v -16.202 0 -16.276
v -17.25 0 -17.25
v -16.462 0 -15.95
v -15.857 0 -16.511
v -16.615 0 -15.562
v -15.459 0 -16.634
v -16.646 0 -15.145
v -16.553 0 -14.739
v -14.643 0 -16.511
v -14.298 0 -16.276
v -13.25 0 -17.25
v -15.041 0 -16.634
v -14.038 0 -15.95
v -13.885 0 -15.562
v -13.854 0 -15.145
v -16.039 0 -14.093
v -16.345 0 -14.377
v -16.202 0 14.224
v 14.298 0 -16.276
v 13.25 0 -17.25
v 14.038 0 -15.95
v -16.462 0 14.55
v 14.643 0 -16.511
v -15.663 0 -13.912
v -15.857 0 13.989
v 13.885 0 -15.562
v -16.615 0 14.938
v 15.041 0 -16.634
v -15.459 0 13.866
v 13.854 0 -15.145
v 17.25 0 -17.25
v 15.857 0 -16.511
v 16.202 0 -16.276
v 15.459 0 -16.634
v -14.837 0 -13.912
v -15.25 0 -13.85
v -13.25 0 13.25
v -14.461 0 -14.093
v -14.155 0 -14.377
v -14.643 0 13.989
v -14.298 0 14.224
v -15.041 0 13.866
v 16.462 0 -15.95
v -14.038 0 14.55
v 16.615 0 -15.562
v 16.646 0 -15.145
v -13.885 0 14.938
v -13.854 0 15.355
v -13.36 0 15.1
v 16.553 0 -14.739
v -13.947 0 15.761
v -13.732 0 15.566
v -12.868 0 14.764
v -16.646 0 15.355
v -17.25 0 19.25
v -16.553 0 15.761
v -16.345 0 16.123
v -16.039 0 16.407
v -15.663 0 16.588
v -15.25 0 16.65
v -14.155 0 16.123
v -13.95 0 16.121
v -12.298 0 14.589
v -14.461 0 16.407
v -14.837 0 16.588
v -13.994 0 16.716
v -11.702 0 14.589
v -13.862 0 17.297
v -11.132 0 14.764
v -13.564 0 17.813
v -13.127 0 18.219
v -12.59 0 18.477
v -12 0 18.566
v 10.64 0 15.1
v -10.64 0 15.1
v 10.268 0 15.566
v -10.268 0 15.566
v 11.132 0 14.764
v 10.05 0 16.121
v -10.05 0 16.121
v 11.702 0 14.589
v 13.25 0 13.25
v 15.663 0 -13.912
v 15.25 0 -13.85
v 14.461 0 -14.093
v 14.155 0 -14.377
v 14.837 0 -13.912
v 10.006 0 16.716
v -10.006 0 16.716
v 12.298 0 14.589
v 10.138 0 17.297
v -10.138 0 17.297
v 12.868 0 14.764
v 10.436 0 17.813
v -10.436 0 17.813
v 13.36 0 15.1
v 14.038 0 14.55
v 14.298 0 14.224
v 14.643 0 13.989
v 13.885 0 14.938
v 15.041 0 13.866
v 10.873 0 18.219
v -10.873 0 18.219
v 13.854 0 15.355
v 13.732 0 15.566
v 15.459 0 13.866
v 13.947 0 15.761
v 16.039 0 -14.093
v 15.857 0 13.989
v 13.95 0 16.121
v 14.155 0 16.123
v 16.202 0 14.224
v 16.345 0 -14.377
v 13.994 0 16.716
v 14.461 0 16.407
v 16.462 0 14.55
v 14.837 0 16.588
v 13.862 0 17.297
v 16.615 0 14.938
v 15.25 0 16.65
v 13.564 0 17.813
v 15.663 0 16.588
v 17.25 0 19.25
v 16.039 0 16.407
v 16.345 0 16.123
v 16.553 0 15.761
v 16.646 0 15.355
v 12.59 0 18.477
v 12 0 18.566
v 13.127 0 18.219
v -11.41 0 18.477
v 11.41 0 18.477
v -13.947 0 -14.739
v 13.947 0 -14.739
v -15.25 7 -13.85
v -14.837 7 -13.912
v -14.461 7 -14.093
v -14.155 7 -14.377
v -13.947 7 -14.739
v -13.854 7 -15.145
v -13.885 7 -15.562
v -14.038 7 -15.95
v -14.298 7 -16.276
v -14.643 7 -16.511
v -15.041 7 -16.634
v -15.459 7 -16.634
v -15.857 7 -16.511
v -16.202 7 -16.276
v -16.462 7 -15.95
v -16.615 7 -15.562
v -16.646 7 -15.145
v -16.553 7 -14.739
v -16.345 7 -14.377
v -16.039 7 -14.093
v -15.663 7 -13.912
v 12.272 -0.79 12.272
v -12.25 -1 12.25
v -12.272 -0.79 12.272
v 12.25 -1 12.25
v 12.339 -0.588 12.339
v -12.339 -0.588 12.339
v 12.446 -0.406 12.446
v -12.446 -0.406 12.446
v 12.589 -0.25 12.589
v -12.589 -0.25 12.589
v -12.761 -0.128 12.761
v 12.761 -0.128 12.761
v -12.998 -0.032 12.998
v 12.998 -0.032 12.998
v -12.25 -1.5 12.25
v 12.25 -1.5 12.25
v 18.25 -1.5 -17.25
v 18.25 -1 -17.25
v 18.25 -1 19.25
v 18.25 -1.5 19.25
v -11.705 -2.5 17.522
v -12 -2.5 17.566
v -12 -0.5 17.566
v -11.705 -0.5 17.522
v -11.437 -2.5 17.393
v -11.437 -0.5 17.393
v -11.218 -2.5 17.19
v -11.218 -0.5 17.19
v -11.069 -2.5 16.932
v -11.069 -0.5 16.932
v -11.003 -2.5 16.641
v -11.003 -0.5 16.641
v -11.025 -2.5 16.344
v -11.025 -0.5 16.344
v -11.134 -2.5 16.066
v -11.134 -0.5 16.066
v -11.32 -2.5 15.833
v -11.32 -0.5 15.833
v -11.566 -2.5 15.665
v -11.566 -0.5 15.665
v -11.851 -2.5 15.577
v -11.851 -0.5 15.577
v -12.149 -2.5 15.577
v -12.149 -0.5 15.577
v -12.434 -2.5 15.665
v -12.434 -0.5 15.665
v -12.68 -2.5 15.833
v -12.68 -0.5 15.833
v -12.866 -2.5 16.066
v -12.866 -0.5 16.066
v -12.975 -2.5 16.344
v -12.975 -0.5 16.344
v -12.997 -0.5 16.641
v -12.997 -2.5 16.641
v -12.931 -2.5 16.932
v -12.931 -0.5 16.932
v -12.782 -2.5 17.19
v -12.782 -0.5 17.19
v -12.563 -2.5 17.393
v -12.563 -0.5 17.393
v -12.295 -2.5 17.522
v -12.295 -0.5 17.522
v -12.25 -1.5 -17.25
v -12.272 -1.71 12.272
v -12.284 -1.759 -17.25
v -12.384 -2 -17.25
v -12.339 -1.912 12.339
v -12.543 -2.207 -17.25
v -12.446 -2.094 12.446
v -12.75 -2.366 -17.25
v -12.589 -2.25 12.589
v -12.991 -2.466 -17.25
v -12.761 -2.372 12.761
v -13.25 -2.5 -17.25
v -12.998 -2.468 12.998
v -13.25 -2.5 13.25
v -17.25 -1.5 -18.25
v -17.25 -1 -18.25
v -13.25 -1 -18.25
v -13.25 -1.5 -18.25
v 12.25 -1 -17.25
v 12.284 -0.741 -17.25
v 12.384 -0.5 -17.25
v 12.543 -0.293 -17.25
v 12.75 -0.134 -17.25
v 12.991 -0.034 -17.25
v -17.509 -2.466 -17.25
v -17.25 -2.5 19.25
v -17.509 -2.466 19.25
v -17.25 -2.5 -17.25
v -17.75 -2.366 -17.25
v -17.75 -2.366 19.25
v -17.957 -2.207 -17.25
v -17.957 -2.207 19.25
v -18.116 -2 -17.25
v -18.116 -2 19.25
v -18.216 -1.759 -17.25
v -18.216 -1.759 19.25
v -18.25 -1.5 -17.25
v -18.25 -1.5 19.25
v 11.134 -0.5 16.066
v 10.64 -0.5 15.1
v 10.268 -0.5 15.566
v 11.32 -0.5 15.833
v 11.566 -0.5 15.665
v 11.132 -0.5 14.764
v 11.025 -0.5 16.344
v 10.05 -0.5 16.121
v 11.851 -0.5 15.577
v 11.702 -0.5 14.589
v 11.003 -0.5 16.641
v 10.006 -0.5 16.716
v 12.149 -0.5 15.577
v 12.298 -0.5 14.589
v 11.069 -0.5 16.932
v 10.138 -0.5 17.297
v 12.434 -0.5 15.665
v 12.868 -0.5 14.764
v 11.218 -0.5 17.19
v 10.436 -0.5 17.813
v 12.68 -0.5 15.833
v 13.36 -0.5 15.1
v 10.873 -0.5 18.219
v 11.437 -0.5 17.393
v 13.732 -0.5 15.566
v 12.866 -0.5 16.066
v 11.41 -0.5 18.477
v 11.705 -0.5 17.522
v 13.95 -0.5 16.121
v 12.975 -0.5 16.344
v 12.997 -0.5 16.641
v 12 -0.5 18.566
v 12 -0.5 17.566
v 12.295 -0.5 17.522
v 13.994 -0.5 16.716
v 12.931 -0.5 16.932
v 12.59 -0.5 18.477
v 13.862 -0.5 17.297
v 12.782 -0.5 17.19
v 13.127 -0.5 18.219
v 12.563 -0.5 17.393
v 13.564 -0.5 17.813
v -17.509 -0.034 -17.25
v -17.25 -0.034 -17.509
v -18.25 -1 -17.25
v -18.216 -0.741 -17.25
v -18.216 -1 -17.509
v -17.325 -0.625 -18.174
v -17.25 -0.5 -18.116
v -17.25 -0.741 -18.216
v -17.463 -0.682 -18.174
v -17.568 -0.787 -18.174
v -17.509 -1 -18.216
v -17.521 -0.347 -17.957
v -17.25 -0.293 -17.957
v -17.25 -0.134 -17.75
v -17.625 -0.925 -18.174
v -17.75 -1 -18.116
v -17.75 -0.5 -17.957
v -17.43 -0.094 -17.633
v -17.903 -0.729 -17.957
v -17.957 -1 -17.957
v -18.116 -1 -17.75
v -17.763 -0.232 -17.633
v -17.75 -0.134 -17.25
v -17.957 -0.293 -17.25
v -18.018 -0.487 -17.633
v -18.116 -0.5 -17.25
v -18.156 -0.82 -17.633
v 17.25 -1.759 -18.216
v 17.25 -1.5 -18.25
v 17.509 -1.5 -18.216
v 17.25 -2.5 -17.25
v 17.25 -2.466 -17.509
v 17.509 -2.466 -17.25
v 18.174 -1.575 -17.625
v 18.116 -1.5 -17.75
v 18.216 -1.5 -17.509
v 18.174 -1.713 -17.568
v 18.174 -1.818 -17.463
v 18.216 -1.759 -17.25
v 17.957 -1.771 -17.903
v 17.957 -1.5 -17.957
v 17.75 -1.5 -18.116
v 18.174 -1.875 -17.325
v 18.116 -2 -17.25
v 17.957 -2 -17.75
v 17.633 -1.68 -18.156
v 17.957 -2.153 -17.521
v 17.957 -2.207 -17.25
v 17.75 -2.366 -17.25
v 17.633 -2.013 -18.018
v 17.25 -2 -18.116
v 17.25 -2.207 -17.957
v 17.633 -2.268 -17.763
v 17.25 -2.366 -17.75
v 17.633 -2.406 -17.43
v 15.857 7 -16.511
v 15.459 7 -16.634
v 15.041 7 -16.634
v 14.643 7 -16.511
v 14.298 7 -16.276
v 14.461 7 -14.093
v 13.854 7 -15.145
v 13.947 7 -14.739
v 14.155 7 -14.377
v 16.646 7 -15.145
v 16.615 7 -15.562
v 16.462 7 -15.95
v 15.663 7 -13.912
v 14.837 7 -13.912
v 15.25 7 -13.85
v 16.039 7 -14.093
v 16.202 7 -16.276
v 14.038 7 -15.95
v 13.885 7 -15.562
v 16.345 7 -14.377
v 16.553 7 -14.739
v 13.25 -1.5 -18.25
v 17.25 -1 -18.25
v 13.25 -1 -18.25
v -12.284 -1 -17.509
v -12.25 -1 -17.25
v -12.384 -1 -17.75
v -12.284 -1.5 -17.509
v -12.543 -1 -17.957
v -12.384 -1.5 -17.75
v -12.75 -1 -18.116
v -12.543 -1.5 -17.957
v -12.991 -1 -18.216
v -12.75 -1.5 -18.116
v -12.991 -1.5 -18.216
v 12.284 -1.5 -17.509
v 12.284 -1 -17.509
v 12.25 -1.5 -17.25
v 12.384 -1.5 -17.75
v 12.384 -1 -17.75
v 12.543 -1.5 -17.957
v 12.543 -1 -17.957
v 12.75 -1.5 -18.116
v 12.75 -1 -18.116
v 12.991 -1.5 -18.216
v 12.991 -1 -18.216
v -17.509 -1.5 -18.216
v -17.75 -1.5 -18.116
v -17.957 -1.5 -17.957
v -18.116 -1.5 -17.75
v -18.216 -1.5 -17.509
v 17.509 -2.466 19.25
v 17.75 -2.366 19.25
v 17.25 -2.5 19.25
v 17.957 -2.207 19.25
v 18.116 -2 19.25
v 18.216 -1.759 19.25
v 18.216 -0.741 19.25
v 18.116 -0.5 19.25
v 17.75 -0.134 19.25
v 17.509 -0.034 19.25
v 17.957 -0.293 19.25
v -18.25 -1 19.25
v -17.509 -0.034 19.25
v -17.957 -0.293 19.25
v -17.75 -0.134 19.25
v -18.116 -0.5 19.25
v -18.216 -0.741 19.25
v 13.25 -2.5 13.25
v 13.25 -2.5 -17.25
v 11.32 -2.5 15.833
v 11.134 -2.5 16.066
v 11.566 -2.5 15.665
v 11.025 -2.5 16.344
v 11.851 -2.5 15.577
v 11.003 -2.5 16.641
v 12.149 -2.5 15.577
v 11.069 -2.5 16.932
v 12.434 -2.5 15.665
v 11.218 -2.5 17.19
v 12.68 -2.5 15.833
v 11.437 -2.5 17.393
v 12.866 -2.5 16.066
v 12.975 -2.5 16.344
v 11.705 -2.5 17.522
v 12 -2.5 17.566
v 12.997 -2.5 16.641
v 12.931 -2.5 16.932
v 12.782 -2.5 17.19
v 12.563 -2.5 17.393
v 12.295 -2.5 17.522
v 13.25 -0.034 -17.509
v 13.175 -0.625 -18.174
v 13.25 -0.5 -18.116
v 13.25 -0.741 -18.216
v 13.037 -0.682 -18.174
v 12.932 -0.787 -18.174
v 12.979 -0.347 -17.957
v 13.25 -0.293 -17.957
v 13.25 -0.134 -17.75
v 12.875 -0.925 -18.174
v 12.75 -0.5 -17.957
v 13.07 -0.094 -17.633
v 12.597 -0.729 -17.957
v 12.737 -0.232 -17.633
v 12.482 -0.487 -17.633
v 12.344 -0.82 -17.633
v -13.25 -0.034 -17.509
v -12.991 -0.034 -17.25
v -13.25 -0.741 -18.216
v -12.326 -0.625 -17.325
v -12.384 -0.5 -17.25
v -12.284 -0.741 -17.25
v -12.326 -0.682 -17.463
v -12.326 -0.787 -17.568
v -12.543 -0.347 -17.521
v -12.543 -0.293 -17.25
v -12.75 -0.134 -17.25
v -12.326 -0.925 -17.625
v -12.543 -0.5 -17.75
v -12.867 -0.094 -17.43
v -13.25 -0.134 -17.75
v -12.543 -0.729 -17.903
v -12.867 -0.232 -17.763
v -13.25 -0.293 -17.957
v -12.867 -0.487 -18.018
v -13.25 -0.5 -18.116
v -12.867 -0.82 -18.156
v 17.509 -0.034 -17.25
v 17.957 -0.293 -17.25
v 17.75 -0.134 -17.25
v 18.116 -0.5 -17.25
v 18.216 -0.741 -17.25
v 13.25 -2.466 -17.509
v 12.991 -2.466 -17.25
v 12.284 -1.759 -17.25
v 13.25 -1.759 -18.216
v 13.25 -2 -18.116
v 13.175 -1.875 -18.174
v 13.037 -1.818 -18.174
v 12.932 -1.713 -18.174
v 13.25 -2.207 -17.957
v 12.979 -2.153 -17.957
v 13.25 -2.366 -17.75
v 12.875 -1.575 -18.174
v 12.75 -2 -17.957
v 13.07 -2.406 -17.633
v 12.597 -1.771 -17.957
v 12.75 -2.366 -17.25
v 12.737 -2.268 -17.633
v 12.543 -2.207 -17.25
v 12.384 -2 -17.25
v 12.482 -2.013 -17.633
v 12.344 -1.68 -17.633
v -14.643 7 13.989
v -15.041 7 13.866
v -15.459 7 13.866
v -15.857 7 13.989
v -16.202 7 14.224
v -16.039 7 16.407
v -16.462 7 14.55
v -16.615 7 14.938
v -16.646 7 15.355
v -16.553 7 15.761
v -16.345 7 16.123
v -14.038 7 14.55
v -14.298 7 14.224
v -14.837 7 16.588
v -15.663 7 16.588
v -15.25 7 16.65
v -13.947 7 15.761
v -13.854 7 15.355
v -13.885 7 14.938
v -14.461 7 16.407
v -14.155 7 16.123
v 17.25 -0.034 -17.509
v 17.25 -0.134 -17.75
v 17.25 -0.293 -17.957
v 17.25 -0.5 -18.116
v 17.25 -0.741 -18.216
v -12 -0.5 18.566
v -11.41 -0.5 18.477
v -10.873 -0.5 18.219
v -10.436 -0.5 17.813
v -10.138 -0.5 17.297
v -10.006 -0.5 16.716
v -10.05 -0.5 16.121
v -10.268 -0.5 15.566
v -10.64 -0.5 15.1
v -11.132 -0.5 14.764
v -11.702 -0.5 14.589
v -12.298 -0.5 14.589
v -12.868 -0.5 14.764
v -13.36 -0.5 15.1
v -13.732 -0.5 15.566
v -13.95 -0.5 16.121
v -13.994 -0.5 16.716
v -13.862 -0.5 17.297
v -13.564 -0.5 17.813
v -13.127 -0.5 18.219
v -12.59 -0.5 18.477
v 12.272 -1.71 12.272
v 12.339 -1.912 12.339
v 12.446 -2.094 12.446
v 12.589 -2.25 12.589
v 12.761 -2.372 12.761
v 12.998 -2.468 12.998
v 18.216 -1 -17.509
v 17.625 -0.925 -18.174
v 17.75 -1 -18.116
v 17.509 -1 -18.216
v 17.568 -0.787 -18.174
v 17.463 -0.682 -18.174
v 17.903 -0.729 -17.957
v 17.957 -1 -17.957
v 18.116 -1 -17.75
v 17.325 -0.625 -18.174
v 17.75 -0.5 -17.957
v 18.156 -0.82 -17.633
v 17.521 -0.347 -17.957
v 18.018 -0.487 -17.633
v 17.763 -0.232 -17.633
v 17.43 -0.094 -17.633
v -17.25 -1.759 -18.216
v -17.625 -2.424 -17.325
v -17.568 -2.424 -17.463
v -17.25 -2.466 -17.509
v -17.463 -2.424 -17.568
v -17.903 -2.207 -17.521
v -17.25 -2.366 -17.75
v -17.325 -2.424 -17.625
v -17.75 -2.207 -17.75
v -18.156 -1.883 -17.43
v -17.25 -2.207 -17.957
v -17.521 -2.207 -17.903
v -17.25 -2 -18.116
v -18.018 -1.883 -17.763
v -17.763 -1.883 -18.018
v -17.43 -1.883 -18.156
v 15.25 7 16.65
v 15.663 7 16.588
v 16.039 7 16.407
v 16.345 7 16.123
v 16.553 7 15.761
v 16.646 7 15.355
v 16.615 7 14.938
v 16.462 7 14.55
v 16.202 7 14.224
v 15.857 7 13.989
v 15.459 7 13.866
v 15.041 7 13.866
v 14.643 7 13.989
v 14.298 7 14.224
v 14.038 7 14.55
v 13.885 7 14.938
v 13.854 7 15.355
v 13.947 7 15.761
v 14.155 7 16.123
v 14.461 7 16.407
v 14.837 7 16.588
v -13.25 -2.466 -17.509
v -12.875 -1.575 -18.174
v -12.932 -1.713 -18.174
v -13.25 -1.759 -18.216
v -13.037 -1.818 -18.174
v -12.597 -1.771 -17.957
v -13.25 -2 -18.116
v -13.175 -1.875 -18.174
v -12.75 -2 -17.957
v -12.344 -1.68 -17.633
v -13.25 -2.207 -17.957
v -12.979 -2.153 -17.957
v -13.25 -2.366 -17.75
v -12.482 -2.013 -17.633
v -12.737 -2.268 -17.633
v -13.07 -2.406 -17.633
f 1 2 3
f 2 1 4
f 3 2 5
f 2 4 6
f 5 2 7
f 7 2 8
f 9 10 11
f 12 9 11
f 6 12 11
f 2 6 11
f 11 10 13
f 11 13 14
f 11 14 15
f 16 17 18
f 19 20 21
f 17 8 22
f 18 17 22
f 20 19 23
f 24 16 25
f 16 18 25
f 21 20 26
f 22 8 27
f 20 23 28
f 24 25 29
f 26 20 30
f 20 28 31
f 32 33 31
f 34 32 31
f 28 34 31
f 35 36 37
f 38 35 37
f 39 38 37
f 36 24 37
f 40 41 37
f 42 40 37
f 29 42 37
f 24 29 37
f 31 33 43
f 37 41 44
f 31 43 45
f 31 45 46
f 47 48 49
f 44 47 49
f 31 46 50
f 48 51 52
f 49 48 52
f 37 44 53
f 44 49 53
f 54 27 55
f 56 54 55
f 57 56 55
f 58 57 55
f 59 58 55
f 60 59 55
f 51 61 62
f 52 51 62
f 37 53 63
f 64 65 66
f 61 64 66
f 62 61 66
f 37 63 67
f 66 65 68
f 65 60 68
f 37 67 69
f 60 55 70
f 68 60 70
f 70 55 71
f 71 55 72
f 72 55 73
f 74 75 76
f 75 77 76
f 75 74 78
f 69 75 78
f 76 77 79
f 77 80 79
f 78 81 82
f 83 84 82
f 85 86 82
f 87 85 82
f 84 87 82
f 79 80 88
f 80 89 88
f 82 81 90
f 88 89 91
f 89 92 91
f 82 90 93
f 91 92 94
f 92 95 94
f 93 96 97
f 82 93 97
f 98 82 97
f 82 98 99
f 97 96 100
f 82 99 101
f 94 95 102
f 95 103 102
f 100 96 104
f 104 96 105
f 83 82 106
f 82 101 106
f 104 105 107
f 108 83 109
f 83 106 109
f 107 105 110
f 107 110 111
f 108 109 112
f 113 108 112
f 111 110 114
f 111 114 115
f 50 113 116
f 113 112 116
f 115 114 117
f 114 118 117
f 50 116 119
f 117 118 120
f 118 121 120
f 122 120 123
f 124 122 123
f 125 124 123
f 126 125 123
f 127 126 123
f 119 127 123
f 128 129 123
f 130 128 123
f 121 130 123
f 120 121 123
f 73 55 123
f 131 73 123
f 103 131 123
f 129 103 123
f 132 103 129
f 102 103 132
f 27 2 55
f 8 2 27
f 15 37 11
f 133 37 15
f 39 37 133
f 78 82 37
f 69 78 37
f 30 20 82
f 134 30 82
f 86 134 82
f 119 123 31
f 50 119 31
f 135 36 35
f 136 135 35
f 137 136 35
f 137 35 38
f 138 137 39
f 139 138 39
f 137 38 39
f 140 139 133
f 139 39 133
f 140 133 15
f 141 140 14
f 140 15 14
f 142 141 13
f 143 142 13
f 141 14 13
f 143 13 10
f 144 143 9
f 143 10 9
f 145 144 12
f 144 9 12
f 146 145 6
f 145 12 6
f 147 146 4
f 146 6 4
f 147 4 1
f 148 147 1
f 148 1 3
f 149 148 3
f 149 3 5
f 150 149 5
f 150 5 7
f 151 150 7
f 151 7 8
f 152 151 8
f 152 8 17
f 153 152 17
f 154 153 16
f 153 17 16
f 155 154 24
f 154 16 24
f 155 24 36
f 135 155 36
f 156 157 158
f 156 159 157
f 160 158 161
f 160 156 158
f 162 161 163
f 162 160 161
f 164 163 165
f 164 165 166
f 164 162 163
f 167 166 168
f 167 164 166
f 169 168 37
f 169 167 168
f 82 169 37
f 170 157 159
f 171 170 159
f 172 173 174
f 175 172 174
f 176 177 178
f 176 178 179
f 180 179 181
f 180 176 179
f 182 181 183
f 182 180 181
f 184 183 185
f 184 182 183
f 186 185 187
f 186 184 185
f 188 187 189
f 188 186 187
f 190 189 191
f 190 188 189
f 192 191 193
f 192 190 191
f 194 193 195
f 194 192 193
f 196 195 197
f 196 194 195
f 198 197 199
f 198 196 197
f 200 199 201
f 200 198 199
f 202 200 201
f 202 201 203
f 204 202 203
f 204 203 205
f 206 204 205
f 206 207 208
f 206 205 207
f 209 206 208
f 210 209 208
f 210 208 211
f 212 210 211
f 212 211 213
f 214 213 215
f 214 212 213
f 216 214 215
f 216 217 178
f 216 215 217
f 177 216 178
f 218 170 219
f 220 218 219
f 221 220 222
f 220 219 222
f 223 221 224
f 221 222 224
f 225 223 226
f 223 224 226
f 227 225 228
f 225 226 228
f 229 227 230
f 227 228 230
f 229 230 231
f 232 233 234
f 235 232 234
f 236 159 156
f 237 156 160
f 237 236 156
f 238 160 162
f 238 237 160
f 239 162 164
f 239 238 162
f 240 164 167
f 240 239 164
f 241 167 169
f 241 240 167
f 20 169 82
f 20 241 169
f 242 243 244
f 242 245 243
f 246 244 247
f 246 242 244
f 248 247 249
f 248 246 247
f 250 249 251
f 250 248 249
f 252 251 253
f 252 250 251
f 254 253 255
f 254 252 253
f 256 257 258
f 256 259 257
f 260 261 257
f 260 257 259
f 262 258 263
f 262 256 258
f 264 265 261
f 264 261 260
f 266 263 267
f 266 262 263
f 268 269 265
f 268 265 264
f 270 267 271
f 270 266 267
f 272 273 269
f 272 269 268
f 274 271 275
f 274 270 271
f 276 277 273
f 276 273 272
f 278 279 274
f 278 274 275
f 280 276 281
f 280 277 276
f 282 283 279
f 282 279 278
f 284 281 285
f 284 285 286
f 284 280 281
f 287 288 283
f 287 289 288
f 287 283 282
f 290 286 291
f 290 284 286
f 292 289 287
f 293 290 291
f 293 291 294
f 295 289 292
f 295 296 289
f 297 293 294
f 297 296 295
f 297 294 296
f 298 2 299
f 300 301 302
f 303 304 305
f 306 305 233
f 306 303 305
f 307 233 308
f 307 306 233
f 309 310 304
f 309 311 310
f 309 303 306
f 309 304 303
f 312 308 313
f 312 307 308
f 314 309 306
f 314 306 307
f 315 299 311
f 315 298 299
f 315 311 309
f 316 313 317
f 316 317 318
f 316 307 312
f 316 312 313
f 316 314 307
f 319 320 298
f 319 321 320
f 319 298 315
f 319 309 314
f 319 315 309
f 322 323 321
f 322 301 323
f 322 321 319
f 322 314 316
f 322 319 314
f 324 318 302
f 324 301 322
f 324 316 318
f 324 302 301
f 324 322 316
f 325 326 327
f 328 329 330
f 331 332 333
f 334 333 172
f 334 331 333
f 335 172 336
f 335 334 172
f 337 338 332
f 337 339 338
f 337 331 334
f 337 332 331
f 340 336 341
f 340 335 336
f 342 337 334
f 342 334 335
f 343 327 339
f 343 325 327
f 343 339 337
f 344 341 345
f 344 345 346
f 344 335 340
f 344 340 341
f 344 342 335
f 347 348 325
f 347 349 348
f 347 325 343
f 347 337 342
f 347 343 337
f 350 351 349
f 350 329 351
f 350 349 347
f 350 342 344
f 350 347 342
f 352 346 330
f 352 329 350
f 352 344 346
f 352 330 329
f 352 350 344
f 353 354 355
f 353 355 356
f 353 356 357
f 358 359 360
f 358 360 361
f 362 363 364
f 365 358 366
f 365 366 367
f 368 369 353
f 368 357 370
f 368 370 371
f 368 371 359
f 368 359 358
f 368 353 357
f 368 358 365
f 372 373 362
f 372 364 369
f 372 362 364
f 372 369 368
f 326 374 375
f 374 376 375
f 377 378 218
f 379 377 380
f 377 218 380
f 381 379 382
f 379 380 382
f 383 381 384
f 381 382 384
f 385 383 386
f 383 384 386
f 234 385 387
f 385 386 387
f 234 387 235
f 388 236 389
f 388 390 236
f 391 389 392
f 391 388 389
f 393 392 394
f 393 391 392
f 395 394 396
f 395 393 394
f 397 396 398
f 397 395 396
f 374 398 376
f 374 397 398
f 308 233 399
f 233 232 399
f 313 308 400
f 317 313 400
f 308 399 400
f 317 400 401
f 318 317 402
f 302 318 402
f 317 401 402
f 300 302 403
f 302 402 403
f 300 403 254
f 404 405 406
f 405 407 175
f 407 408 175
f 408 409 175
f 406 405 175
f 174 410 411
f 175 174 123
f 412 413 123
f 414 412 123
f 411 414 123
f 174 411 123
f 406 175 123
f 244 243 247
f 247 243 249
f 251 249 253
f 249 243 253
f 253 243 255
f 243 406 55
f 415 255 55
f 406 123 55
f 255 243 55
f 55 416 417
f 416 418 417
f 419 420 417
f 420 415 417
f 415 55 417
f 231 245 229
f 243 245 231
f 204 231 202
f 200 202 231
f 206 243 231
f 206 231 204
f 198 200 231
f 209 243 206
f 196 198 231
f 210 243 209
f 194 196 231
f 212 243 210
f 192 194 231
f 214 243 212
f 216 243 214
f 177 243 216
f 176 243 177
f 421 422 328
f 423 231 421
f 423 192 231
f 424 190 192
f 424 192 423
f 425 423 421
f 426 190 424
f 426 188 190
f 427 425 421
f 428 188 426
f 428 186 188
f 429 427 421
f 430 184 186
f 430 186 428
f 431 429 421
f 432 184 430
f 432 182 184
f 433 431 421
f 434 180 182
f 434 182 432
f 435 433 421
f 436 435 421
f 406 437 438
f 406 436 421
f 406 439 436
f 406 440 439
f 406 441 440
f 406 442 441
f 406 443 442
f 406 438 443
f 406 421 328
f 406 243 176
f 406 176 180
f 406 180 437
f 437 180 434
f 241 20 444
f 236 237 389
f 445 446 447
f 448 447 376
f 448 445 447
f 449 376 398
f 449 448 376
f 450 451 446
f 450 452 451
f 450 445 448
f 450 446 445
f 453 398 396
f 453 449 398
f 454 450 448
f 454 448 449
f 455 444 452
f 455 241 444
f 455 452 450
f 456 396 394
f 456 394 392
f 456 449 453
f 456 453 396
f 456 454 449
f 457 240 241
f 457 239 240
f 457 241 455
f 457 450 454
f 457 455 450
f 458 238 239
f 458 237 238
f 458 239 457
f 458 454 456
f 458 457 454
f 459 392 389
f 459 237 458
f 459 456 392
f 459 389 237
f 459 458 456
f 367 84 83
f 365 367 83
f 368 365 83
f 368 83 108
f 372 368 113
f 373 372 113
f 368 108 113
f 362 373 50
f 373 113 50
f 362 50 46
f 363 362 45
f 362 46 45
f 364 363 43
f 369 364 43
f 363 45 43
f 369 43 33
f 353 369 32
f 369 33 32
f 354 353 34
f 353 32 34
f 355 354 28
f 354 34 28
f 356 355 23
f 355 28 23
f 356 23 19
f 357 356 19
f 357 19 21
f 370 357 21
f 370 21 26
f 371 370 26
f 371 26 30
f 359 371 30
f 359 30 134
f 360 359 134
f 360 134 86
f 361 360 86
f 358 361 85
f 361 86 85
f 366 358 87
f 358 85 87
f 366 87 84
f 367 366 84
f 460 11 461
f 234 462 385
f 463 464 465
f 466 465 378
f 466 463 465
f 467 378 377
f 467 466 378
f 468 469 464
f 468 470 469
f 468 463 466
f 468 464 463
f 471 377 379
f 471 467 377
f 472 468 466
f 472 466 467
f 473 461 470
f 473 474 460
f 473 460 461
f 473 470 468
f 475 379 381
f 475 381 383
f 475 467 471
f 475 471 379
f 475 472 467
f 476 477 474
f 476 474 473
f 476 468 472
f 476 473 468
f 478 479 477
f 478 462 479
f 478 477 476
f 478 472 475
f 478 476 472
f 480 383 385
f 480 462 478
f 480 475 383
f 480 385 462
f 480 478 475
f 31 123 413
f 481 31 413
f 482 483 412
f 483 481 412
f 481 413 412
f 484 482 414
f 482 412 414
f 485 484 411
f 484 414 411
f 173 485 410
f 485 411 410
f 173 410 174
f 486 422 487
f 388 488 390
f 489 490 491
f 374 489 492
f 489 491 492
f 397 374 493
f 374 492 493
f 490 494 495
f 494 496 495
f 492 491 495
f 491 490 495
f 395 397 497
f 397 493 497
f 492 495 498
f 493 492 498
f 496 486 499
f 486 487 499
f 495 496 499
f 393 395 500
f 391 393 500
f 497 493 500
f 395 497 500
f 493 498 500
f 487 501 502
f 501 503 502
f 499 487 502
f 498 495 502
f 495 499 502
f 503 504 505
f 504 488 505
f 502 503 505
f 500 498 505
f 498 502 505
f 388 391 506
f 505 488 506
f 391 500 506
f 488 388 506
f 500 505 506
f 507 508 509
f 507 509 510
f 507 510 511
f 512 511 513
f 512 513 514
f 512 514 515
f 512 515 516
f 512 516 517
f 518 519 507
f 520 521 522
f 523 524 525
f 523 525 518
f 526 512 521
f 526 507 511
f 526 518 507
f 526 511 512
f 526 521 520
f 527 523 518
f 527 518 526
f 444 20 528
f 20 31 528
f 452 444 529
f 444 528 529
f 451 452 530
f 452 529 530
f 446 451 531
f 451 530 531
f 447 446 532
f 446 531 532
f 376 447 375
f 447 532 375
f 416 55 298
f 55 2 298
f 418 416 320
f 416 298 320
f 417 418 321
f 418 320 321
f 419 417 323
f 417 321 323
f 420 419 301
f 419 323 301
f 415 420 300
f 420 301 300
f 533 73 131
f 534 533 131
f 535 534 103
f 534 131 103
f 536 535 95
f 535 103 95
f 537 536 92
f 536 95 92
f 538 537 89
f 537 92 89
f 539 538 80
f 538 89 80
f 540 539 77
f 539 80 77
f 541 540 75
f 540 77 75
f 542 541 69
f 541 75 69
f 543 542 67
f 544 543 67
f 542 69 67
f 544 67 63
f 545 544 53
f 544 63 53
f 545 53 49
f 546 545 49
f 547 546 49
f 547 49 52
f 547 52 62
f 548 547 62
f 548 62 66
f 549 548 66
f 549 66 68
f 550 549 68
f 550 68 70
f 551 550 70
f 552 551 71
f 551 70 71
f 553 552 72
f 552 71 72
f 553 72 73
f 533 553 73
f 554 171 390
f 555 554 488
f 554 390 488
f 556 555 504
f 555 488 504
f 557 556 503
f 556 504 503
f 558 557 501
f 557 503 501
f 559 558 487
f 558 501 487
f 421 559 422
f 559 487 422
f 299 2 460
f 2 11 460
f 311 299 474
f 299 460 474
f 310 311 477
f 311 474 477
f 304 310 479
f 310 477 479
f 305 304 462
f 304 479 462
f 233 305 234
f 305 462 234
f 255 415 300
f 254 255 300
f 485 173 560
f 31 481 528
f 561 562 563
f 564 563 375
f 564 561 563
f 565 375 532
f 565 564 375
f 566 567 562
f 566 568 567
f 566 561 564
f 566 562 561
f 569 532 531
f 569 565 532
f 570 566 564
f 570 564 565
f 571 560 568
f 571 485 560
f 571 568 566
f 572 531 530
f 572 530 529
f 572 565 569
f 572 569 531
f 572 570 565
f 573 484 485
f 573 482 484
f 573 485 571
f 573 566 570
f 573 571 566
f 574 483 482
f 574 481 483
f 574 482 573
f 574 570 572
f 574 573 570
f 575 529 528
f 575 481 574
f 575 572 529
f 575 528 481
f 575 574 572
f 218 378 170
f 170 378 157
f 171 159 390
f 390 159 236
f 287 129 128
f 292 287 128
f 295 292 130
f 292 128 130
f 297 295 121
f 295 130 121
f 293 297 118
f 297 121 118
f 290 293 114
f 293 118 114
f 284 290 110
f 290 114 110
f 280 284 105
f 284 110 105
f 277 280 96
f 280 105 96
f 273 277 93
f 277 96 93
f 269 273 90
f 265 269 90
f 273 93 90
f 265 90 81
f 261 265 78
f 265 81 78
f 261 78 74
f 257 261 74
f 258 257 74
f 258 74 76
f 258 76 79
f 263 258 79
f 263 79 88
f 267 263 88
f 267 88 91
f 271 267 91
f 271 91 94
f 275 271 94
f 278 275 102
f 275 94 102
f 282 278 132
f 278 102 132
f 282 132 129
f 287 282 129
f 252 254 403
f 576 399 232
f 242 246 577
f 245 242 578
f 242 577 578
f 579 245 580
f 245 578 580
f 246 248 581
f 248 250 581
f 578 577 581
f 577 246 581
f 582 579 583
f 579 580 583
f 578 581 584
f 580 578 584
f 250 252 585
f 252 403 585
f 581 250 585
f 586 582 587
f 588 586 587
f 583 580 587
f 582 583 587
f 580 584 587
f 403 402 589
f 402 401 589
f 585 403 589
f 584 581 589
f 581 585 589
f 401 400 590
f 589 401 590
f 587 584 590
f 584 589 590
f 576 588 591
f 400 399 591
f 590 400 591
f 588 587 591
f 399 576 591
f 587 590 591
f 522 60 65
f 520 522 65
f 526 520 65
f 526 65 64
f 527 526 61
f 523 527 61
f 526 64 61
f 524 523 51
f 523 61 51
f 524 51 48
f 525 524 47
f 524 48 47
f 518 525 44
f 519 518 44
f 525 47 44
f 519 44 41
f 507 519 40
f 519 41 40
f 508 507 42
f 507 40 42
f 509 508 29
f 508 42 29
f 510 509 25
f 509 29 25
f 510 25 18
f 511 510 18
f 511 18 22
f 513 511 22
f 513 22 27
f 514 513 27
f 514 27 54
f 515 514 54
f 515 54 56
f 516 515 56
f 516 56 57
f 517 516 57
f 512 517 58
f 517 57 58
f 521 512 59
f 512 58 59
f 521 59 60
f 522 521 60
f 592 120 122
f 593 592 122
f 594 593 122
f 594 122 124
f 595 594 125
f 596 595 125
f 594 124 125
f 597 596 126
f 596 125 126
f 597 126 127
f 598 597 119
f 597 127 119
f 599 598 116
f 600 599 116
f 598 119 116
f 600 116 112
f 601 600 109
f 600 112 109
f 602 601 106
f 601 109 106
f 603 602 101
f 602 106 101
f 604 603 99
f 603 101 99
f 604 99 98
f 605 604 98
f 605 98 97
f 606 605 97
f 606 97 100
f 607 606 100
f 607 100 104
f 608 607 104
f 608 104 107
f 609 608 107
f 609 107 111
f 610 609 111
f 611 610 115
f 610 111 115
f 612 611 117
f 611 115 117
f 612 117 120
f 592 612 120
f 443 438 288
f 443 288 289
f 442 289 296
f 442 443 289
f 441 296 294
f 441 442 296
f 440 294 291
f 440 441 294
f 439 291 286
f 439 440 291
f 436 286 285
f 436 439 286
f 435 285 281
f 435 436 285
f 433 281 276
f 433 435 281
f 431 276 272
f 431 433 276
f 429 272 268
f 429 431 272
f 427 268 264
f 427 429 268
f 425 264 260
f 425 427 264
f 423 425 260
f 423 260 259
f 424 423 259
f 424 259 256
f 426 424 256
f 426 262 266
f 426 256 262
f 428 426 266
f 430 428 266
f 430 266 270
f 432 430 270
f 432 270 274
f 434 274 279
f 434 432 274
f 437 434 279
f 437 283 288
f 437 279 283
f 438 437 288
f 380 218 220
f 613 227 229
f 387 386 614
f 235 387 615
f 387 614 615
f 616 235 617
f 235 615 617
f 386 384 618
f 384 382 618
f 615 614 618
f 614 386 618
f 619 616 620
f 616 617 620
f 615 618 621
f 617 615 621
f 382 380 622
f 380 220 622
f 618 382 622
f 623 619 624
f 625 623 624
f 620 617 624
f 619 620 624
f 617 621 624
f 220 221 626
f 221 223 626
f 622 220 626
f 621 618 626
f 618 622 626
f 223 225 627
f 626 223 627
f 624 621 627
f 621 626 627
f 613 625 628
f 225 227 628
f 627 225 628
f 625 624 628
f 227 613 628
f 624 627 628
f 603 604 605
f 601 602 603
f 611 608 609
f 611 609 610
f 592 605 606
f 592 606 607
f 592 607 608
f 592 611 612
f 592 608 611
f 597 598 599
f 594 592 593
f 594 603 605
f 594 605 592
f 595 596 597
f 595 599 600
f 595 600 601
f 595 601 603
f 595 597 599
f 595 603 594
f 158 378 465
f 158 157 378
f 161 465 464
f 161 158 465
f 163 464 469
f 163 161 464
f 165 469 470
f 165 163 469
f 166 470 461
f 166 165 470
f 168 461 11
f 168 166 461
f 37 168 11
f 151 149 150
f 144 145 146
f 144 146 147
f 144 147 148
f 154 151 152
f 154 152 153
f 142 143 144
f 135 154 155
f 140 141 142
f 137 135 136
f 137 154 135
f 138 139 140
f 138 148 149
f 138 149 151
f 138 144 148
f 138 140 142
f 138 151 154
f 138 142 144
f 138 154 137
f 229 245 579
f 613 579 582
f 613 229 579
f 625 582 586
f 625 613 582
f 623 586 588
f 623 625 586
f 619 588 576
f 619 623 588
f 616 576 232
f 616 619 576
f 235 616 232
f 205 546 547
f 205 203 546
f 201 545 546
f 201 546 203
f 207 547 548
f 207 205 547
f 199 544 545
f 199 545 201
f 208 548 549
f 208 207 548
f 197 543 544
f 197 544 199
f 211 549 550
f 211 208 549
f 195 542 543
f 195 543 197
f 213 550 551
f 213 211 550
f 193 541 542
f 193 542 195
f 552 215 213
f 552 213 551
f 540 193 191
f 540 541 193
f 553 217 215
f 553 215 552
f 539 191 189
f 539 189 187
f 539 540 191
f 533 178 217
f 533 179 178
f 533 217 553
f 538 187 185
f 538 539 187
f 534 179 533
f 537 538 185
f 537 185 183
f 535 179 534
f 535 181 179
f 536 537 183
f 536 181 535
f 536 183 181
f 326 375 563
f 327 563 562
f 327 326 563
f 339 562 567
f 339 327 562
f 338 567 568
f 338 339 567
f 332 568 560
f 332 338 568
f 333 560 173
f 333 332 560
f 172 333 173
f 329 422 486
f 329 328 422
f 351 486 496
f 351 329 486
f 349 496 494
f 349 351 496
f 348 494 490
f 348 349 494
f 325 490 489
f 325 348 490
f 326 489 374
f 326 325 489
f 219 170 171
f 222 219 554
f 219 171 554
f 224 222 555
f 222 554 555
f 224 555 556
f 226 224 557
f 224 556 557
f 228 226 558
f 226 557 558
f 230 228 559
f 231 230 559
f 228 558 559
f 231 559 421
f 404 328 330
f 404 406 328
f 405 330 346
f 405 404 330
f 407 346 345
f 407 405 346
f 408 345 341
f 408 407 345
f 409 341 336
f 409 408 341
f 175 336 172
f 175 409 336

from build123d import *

# Parameters (mm, degrees)
SKETCH1_R               = 1.4
BOSS_EXTRUDE1_DEPTH     = 7
BOSS_EXTRUDE1_2_DEPTH   = 7
BOSS_EXTRUDE1_3_DEPTH   = 7
BOSS_EXTRUDE1_4_DEPTH   = 7
BOSS_EXTRUDE2_DEPTH     = 2.5
FILLET1_R               = 1
CUT_EXTRUDE1_DEPTH      = 28.434011737
CUT_EXTRUDE1_DEPTH_BACK = 28.434011737
SKETCH4_R               = 1
SKETCH5_R               = 2
CUT_EXTRUDE2_DEPTH      = 0.5


with BuildPart() as part:
    # Sketch1 → Boss-Extrude1 (new body)
    with BuildSketch(Plane(origin=(0, 0, 0), x_dir=(1, 0, 0), z_dir=(0, 1, 0))):
        with Locations(Location((-15.25, -15.25, 0), (0, 0, 270))):
            Circle(SKETCH1_R)
    extrude(amount=BOSS_EXTRUDE1_DEPTH)



with BuildPart() as body_2:
    # Sketch1 → Boss-Extrude1 2 (new body)
    with BuildSketch(Plane(origin=(0, 0, 0), x_dir=(1, 0, 0), z_dir=(0, 1, 0))):
        with Locations(Location((-15.25, 15.25, 0), (0, 0, 270))):
            Circle(SKETCH1_R)
    extrude(amount=BOSS_EXTRUDE1_2_DEPTH)


with BuildPart() as body_3:
    # Sketch1 → Boss-Extrude1 3 (new body)
    with BuildSketch(Plane(origin=(0, 0, 0), x_dir=(1, 0, 0), z_dir=(0, 1, 0))):
        with Locations(Location((15.25, 15.25, 0), (0, 0, 270))):
            Circle(SKETCH1_R)
    extrude(amount=BOSS_EXTRUDE1_3_DEPTH)


with BuildPart() as body_4:
    # Sketch1 → Boss-Extrude1 4 (new body)
    with BuildSketch(Plane(origin=(0, 0, 0), x_dir=(1, 0, 0), z_dir=(0, 1, 0))):
        with Locations(Location((15.25, -15.25, 0), (0, 0, 270))):
            Circle(SKETCH1_R)
    extrude(amount=BOSS_EXTRUDE1_4_DEPTH)


with BuildPart() as part_1:
    add(part.part)

    add(body_2.part)  # Boss-Extrude2 merges body 2

    add(body_3.part)  # Boss-Extrude2 merges body 3

    add(body_4.part)  # Boss-Extrude2 merges body 4
    # Sketch2 → Boss-Extrude2 (add)
    with BuildSketch(Plane.XZ):
        Polygon((-12.25, 12.25), (12.25, 12.25), (12.25, -18.25), (18.25, -18.25), (18.25, 19.25), (-18.25, 19.25), (-18.25, -18.25), (-12.25, -18.25), align=None)
    extrude(amount=BOSS_EXTRUDE2_DEPTH)

    # Fillet1
    fillet1_edges = [part_1.edges().sort_by_distance(p)[0] for p in [
        (-12.25, -2.5, -3),
        (0, -2.5, 12.25),
        (12.25, -2.5, -3),
        (15.25, -2.5, -18.25),
        (18.25, 0, 0.5),
        (18.25, -1.25, -18.25),
        (-18.25, 0, 0.5),
        (-15.25, 0, -18.25),
        (-18.25, -1.25, -18.25),
        (-12.25, 0, -3),
        (-12.25, -1.25, -18.25),
        (0, 0, 12.25),
        (12.25, 0, -3),
        (15.25, 0, -18.25),
        (12.25, -1.25, -18.25),
        (18.25, -2.5, 0.5),
        (-18.25, -2.5, 0.5),
        (-15.25, -2.5, -18.25),
    ]]
    fillet(fillet1_edges, radius=FILLET1_R)

    # Sketch4 → Cut-Extrude1 (cut, two sides: drawn at the far end of the back side and taken through both)
    with BuildSketch(Plane(origin=(0, 0, 0), x_dir=(1, 0, 0), z_dir=(0, 1, 0)).offset(-CUT_EXTRUDE1_DEPTH_BACK)):
        with Locations(Location((-12, -16.566325801, 0), (0, 0, 270))):
            Circle(SKETCH4_R)
        with Locations(Location((12, -16.566325801, 0), (0, 0, 270))):
            Circle(SKETCH4_R)
    extrude(amount=CUT_EXTRUDE1_DEPTH + CUT_EXTRUDE1_DEPTH_BACK, mode=Mode.SUBTRACT)

    # Sketch5 → Cut-Extrude2 (cut)
    with BuildSketch(Plane(origin=(0, 0, 0), x_dir=(1, 0, 0), z_dir=(0, 1, 0))):
        with Locations(Location((-12, -16.566325801, 0), (0, 0, 270))):
            Circle(SKETCH5_R)
        with Locations(Location((12, -16.566325801, 0), (0, 0, 270))):
            Circle(SKETCH5_R)
    extrude(amount=-CUT_EXTRUDE2_DEPTH, mode=Mode.SUBTRACT)


solid = part_1.part
